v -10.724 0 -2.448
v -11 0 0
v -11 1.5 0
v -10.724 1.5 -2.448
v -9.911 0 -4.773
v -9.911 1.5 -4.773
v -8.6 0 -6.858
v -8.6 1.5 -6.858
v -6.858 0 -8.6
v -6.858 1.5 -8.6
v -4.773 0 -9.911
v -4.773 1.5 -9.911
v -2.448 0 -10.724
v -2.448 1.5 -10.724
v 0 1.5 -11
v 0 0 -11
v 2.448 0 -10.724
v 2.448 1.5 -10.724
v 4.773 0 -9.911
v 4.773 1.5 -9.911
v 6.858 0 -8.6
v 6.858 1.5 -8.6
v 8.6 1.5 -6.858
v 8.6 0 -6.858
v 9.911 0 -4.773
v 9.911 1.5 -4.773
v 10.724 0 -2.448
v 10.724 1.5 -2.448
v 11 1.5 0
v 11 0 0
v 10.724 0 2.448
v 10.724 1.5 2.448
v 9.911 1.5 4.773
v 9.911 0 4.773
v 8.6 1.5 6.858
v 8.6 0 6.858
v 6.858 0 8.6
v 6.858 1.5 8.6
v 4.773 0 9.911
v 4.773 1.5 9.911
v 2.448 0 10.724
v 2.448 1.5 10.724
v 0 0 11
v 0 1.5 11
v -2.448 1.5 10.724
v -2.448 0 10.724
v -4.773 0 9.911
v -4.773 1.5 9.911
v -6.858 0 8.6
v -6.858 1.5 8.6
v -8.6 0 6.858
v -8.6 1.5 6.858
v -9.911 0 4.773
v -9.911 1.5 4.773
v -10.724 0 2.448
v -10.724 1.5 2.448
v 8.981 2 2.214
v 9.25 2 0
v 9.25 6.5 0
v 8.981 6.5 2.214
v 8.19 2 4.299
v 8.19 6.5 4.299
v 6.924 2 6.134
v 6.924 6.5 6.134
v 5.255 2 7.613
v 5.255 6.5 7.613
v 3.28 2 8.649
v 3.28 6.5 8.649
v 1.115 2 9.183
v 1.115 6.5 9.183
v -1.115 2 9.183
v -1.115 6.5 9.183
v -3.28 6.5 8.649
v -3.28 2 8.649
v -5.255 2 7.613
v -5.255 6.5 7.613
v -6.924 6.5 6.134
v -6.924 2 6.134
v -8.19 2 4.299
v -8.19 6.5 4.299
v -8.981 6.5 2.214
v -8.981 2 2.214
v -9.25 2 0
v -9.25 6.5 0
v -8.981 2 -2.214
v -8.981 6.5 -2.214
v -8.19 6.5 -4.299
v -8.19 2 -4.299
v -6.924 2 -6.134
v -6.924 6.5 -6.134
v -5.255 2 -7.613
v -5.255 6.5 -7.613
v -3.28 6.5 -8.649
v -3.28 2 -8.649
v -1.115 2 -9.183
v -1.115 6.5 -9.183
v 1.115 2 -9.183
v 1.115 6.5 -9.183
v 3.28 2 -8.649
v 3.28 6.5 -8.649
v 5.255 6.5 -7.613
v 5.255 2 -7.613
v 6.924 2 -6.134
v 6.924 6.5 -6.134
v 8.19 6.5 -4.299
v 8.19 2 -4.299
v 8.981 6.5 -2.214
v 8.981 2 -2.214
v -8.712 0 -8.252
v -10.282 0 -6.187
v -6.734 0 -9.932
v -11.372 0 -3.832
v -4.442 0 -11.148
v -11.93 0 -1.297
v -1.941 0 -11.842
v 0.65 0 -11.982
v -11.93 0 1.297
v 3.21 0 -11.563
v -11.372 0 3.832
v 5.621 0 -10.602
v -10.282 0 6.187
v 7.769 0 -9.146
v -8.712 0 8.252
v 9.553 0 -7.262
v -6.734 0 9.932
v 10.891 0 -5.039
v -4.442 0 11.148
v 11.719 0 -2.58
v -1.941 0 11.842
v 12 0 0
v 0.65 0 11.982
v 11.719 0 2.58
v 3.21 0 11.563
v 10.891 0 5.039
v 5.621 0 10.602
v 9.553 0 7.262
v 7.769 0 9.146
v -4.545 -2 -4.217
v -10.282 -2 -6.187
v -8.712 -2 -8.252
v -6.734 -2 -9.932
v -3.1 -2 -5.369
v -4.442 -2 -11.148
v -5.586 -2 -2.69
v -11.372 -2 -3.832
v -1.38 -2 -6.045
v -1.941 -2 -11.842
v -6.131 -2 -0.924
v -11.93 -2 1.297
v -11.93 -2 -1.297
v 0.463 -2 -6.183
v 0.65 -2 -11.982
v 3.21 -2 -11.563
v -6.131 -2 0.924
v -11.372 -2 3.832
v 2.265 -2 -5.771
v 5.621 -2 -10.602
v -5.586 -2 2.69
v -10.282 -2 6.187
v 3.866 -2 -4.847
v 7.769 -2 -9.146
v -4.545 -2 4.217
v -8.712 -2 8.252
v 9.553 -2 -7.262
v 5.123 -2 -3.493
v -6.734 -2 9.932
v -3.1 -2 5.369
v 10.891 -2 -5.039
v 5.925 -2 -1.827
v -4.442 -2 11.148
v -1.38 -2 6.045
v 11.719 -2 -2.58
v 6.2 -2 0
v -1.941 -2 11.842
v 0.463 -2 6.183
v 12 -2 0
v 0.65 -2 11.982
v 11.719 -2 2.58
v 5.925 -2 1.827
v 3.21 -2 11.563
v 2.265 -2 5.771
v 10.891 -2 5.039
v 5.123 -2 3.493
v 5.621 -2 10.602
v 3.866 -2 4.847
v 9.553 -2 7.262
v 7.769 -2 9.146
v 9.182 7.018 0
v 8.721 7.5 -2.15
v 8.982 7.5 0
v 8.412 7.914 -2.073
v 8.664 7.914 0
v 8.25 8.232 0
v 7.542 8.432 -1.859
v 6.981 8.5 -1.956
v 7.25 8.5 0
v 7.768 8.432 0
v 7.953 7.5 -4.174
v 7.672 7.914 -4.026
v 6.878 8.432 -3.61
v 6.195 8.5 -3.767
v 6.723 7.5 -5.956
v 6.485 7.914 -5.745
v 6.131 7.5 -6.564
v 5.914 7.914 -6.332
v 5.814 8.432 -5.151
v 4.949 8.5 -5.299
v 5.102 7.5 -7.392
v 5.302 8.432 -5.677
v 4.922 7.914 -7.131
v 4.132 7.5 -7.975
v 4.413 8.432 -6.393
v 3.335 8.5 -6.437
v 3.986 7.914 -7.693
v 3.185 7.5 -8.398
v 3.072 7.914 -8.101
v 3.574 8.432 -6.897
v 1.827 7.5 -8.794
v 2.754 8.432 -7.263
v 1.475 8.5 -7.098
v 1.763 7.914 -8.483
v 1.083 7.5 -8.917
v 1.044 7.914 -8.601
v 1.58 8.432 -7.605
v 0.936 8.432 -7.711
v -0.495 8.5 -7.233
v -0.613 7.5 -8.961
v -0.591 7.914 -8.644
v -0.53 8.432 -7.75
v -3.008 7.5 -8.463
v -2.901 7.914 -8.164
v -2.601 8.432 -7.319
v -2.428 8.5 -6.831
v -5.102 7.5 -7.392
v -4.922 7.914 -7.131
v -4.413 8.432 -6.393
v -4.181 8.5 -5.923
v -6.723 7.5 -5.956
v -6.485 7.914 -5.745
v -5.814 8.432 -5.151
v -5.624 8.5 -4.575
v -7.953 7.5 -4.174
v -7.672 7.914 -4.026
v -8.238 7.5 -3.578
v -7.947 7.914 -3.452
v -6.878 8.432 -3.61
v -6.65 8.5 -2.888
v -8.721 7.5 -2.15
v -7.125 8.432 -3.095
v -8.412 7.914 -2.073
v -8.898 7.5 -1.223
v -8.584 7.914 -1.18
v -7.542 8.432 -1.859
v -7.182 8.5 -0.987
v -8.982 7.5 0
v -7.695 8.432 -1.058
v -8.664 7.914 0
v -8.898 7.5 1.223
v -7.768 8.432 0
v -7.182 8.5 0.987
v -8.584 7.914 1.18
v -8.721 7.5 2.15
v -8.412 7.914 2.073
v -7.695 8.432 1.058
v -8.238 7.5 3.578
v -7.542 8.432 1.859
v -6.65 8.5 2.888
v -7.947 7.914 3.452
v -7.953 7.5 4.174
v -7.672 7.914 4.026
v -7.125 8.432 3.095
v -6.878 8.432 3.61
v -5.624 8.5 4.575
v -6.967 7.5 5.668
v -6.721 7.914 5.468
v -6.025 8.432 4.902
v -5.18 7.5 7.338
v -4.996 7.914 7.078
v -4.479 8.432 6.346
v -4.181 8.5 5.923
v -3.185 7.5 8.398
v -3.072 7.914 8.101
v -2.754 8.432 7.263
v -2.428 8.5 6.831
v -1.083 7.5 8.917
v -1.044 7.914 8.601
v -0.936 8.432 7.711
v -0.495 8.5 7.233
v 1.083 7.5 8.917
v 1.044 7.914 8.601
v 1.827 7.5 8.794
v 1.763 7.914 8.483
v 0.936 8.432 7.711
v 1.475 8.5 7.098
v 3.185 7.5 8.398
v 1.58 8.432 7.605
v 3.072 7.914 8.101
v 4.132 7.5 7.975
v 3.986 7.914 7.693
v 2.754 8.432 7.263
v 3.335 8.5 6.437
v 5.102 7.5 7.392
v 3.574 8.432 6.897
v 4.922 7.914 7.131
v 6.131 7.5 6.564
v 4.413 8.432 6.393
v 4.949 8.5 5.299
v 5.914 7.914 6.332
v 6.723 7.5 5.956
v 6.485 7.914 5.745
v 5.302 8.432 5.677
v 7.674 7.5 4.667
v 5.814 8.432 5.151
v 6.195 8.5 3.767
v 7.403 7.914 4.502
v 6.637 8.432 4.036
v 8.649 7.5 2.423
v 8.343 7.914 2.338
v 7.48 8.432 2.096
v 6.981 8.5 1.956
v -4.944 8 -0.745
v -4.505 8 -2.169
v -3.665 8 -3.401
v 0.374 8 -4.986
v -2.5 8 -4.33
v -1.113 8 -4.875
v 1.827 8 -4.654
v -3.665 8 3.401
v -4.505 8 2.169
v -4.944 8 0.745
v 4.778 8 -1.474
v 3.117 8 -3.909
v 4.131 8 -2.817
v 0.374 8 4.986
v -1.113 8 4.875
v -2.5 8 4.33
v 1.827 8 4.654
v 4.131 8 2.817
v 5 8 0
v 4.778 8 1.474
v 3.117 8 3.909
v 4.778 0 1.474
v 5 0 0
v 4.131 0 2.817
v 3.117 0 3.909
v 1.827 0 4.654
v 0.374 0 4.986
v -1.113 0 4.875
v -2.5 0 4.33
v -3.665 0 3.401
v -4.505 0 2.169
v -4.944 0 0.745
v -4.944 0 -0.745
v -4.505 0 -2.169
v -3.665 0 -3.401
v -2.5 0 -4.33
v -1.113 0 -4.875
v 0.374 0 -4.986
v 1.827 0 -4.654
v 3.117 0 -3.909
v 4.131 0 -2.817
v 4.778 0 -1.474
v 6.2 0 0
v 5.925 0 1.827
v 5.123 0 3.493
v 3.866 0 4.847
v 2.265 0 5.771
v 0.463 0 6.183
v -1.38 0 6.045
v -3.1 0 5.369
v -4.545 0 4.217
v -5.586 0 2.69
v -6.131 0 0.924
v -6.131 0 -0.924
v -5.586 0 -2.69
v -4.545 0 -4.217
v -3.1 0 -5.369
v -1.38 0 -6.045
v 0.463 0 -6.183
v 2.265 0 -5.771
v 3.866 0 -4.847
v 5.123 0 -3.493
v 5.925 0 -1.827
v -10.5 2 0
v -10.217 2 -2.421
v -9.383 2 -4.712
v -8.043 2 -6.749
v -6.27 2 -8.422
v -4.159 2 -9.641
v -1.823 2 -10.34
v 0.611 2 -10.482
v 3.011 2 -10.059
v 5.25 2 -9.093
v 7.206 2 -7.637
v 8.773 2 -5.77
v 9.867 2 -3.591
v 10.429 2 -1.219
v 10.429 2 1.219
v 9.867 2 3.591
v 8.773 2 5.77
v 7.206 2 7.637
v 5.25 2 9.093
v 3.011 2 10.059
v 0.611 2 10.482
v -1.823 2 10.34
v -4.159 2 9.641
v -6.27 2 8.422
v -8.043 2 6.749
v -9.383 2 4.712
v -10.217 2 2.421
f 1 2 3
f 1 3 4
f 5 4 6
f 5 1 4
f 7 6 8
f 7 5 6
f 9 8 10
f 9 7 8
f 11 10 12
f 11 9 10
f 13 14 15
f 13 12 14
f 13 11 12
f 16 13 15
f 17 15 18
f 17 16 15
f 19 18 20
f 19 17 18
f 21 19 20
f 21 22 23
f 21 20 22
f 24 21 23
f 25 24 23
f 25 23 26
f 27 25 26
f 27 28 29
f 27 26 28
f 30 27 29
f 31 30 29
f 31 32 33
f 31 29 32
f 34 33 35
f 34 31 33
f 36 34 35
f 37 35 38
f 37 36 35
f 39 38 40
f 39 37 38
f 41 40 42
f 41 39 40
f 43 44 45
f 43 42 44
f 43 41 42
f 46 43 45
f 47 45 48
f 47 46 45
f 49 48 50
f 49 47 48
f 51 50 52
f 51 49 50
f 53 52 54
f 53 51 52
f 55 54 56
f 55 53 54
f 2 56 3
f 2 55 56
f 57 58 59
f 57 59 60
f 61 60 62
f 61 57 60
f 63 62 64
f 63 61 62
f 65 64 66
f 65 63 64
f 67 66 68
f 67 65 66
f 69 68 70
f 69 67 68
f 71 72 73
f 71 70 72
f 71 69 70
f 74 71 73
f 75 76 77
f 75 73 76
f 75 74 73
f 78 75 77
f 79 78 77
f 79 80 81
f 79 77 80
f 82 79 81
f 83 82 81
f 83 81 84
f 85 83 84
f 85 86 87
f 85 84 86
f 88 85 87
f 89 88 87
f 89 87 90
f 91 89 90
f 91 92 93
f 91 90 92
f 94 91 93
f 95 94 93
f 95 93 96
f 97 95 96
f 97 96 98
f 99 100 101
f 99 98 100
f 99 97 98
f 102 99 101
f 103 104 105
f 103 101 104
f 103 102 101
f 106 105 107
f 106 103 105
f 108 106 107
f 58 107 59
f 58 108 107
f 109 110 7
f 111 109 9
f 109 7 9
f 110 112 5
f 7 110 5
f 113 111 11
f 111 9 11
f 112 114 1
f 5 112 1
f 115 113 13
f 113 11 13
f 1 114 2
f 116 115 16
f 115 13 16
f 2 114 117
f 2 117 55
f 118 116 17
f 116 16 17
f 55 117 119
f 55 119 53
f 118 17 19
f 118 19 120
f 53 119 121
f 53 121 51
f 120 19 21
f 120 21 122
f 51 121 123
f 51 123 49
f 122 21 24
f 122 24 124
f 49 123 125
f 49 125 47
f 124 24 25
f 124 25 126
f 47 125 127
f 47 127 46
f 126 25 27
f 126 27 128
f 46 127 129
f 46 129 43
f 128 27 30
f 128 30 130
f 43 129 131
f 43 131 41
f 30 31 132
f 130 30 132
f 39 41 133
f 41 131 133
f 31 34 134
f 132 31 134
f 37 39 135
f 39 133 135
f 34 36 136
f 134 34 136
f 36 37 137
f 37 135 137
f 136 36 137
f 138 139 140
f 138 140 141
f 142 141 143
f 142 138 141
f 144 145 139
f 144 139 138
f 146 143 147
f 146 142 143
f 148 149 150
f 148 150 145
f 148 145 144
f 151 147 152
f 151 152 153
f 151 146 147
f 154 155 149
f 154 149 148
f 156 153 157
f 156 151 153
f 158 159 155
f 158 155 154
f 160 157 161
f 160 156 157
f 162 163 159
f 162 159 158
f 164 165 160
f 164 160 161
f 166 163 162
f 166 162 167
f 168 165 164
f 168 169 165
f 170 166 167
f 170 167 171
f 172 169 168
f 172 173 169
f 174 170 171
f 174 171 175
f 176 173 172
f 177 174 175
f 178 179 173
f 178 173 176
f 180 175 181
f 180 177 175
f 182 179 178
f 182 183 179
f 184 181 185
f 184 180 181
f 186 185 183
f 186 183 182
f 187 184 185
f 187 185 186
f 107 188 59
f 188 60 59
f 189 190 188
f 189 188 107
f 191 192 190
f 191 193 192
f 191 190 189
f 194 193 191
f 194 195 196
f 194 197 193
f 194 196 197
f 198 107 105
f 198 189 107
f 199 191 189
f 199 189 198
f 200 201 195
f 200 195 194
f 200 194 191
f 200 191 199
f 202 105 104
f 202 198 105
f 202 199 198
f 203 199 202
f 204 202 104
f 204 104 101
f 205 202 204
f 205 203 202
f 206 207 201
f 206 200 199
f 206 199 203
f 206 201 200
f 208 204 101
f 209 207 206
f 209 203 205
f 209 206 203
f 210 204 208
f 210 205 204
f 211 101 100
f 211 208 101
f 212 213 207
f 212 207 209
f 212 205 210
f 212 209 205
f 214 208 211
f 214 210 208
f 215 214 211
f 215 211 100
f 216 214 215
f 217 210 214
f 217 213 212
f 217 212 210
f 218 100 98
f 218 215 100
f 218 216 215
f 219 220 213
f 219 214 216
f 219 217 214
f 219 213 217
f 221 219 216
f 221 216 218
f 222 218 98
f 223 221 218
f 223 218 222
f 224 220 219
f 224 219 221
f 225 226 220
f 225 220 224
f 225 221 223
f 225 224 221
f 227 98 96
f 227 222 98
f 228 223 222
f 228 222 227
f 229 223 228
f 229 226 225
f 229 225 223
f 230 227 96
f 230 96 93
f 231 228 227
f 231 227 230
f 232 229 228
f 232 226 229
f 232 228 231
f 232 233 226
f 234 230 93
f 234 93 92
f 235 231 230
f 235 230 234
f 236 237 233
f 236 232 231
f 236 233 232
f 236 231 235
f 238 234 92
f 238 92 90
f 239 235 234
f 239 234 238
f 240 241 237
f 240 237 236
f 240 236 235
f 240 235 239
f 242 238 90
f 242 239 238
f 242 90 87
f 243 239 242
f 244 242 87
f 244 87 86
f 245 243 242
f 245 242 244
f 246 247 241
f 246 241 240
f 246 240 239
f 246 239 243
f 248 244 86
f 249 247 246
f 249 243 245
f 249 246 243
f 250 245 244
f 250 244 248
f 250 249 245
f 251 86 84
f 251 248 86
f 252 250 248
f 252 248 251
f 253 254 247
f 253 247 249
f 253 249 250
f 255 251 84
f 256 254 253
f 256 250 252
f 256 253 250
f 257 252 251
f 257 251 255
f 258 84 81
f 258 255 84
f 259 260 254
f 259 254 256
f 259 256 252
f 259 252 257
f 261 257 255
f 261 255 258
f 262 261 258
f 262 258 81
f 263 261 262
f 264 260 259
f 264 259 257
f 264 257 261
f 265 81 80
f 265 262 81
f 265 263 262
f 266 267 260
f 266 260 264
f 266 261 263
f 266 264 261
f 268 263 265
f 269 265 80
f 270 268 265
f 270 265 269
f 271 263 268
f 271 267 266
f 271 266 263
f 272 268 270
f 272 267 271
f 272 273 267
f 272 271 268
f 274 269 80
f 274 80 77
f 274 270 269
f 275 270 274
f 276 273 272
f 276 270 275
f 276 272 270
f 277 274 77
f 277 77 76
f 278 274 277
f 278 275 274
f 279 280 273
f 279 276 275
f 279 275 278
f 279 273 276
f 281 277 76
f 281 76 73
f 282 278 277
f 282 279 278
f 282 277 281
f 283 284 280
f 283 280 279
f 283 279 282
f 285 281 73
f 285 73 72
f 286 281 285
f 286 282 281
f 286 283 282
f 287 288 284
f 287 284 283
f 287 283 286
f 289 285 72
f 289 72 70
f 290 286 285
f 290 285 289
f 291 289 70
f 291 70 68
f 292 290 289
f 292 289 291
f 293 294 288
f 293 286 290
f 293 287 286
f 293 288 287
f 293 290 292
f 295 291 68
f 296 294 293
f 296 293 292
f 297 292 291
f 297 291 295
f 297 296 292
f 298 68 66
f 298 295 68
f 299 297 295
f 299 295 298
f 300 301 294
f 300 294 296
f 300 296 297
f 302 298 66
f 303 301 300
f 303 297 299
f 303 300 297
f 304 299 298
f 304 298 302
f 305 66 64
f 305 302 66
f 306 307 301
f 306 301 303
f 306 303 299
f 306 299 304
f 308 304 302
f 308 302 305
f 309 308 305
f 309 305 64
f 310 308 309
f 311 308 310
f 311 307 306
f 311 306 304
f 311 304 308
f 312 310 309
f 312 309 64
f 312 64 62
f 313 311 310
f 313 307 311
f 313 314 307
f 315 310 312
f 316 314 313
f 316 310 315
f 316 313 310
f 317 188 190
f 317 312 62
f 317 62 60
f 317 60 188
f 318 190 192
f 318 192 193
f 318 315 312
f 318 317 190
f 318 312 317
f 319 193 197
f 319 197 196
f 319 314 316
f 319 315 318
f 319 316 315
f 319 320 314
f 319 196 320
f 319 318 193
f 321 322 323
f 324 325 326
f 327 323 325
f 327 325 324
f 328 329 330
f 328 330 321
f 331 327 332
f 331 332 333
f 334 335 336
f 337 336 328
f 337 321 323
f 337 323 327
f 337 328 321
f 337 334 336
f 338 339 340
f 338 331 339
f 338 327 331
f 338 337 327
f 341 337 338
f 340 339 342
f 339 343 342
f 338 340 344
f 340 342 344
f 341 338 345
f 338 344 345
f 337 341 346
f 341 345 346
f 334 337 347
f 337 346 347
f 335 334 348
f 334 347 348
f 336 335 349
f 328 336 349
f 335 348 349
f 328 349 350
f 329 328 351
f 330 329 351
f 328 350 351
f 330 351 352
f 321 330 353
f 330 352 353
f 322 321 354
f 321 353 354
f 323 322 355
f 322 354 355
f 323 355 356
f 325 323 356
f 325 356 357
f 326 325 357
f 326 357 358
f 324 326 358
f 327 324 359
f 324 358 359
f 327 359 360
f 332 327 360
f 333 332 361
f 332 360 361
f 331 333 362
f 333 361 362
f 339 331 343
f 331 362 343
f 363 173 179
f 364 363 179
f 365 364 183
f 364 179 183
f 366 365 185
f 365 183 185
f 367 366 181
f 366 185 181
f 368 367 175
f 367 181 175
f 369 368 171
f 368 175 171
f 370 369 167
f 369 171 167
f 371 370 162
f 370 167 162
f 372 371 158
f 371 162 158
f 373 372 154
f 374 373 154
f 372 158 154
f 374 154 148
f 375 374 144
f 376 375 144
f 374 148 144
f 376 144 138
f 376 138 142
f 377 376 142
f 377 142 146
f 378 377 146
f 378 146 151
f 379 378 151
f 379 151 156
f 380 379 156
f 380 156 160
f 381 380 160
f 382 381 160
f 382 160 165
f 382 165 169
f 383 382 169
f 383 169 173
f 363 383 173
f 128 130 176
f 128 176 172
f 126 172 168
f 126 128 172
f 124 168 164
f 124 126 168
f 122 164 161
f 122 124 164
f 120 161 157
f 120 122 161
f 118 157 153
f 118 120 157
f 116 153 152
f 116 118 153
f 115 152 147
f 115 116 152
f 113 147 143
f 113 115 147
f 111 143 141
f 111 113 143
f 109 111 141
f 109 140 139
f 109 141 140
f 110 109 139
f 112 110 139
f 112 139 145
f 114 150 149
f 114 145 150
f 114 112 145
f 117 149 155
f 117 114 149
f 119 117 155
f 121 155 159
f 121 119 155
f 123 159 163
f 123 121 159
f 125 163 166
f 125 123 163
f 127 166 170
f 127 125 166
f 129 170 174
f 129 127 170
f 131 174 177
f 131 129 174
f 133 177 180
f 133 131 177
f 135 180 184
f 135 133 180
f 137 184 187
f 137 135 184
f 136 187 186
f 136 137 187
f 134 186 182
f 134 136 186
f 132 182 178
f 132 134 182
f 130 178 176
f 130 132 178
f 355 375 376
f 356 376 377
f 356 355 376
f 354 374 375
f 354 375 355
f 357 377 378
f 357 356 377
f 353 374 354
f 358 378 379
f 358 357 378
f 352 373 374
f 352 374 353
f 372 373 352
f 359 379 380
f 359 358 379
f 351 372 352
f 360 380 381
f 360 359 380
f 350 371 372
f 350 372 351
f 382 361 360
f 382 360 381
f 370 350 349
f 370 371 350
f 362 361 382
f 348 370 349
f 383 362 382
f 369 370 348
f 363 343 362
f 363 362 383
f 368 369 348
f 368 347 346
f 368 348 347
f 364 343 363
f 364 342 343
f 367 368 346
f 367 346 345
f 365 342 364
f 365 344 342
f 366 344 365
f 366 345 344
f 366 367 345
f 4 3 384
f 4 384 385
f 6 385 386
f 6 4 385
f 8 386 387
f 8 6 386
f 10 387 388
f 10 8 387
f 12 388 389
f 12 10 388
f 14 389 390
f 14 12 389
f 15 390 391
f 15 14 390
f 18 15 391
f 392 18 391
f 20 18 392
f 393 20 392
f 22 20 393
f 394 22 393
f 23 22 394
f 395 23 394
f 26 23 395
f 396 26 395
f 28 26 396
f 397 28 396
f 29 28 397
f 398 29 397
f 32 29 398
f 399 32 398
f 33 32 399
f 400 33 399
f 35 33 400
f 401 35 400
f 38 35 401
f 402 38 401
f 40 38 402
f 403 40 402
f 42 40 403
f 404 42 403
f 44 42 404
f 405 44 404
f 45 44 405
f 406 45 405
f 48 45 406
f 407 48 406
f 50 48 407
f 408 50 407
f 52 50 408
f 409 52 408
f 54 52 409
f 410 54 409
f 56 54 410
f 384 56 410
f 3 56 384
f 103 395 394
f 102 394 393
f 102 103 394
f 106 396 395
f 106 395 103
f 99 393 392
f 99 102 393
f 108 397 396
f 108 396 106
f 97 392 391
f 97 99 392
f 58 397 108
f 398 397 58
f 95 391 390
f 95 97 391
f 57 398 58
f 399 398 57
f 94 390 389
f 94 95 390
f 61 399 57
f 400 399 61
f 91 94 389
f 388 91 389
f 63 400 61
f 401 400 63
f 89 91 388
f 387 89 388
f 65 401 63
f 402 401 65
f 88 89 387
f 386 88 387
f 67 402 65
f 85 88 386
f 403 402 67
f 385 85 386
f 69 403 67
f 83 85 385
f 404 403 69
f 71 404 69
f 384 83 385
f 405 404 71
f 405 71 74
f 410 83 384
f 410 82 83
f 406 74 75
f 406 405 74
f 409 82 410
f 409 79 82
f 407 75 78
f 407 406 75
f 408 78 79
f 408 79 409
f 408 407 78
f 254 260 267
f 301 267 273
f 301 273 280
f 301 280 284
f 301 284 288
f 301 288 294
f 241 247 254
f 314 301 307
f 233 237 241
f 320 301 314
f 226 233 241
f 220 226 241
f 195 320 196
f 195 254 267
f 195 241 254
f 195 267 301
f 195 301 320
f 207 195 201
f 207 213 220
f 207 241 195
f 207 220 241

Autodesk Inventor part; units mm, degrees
ref_plane "YZ Plane" through (0, 0, 0) normal (1, 0, 0) x (0, 1, 0)
ref_plane "XZ Plane" through (0, 0, 0) normal (0, 1, 0) x (-1, 0, 0)
ref_plane "XY Plane" through (0, 0, 0) normal (0, 0, 1) x (1, 0, 0)
sketch "Sketch1" plane through (0, 0, 0) normal (0, 1, 0) x (-1, 0, 0)
  circle A0 centre (0, 0) radius 11
  dimension "d0" = 22
extrude "Extrusion1" add sketch "Sketch1" along normal blind 2
sketch "Sketch2" plane through (0, 2, 0) normal (0, 1, 0) x (1, 0, 0)
  circle A0 centre (0, 0) radius 11 projected
  circle A1 centre (0, 0) radius 9.25
  dimension "d3" = 18.5
extrude "Extrusion2" add sketch "Sketch2" along normal blind 6.5 contours A1
fillet "Fillet1" radius 2 1 edges at (-9.25, 8.5, 0)
sketch "Sketch3" plane through (0, 0, 0) normal (0, -1, 0) x (1, 0, 0)
  circle A0 centre (0, 0) radius 11 projected
  circle A1 centre (0, 0) radius 12
  dimension "d7" = 24
extrude "Extrusion3" add sketch "Sketch3" along normal blind 2 contours A0 | A1
chamfer "Chamfer1" distance 0.5 angle 45 1 edges at (11, 2, 0)
sketch "Sketch4" plane through (0, -2, 0) normal (0, -1, 0) x (1, 0, 0)
  circle A0 centre (0, 0) radius 12 projected
  circle A1 centre (0, 0) radius 5
  dimension "d13" = 10
extrude "Extrusion4" cut sketch "Sketch4" against normal blind 10 contours A1
sketch "Sketch5" plane through (0, -2, 0) normal (0, -1, 0) x (1, 0, 0)
  circle A0 centre (0, 0) radius 5 projected
  circle A1 centre (0, 0) radius 12 projected
  circle A2 centre (0, 0) radius 6.2
  dimension "d16" = 12.4
extrude "Extrusion5" cut sketch "Sketch5" against normal blind 2 contours A2
properties part number "guzik"
